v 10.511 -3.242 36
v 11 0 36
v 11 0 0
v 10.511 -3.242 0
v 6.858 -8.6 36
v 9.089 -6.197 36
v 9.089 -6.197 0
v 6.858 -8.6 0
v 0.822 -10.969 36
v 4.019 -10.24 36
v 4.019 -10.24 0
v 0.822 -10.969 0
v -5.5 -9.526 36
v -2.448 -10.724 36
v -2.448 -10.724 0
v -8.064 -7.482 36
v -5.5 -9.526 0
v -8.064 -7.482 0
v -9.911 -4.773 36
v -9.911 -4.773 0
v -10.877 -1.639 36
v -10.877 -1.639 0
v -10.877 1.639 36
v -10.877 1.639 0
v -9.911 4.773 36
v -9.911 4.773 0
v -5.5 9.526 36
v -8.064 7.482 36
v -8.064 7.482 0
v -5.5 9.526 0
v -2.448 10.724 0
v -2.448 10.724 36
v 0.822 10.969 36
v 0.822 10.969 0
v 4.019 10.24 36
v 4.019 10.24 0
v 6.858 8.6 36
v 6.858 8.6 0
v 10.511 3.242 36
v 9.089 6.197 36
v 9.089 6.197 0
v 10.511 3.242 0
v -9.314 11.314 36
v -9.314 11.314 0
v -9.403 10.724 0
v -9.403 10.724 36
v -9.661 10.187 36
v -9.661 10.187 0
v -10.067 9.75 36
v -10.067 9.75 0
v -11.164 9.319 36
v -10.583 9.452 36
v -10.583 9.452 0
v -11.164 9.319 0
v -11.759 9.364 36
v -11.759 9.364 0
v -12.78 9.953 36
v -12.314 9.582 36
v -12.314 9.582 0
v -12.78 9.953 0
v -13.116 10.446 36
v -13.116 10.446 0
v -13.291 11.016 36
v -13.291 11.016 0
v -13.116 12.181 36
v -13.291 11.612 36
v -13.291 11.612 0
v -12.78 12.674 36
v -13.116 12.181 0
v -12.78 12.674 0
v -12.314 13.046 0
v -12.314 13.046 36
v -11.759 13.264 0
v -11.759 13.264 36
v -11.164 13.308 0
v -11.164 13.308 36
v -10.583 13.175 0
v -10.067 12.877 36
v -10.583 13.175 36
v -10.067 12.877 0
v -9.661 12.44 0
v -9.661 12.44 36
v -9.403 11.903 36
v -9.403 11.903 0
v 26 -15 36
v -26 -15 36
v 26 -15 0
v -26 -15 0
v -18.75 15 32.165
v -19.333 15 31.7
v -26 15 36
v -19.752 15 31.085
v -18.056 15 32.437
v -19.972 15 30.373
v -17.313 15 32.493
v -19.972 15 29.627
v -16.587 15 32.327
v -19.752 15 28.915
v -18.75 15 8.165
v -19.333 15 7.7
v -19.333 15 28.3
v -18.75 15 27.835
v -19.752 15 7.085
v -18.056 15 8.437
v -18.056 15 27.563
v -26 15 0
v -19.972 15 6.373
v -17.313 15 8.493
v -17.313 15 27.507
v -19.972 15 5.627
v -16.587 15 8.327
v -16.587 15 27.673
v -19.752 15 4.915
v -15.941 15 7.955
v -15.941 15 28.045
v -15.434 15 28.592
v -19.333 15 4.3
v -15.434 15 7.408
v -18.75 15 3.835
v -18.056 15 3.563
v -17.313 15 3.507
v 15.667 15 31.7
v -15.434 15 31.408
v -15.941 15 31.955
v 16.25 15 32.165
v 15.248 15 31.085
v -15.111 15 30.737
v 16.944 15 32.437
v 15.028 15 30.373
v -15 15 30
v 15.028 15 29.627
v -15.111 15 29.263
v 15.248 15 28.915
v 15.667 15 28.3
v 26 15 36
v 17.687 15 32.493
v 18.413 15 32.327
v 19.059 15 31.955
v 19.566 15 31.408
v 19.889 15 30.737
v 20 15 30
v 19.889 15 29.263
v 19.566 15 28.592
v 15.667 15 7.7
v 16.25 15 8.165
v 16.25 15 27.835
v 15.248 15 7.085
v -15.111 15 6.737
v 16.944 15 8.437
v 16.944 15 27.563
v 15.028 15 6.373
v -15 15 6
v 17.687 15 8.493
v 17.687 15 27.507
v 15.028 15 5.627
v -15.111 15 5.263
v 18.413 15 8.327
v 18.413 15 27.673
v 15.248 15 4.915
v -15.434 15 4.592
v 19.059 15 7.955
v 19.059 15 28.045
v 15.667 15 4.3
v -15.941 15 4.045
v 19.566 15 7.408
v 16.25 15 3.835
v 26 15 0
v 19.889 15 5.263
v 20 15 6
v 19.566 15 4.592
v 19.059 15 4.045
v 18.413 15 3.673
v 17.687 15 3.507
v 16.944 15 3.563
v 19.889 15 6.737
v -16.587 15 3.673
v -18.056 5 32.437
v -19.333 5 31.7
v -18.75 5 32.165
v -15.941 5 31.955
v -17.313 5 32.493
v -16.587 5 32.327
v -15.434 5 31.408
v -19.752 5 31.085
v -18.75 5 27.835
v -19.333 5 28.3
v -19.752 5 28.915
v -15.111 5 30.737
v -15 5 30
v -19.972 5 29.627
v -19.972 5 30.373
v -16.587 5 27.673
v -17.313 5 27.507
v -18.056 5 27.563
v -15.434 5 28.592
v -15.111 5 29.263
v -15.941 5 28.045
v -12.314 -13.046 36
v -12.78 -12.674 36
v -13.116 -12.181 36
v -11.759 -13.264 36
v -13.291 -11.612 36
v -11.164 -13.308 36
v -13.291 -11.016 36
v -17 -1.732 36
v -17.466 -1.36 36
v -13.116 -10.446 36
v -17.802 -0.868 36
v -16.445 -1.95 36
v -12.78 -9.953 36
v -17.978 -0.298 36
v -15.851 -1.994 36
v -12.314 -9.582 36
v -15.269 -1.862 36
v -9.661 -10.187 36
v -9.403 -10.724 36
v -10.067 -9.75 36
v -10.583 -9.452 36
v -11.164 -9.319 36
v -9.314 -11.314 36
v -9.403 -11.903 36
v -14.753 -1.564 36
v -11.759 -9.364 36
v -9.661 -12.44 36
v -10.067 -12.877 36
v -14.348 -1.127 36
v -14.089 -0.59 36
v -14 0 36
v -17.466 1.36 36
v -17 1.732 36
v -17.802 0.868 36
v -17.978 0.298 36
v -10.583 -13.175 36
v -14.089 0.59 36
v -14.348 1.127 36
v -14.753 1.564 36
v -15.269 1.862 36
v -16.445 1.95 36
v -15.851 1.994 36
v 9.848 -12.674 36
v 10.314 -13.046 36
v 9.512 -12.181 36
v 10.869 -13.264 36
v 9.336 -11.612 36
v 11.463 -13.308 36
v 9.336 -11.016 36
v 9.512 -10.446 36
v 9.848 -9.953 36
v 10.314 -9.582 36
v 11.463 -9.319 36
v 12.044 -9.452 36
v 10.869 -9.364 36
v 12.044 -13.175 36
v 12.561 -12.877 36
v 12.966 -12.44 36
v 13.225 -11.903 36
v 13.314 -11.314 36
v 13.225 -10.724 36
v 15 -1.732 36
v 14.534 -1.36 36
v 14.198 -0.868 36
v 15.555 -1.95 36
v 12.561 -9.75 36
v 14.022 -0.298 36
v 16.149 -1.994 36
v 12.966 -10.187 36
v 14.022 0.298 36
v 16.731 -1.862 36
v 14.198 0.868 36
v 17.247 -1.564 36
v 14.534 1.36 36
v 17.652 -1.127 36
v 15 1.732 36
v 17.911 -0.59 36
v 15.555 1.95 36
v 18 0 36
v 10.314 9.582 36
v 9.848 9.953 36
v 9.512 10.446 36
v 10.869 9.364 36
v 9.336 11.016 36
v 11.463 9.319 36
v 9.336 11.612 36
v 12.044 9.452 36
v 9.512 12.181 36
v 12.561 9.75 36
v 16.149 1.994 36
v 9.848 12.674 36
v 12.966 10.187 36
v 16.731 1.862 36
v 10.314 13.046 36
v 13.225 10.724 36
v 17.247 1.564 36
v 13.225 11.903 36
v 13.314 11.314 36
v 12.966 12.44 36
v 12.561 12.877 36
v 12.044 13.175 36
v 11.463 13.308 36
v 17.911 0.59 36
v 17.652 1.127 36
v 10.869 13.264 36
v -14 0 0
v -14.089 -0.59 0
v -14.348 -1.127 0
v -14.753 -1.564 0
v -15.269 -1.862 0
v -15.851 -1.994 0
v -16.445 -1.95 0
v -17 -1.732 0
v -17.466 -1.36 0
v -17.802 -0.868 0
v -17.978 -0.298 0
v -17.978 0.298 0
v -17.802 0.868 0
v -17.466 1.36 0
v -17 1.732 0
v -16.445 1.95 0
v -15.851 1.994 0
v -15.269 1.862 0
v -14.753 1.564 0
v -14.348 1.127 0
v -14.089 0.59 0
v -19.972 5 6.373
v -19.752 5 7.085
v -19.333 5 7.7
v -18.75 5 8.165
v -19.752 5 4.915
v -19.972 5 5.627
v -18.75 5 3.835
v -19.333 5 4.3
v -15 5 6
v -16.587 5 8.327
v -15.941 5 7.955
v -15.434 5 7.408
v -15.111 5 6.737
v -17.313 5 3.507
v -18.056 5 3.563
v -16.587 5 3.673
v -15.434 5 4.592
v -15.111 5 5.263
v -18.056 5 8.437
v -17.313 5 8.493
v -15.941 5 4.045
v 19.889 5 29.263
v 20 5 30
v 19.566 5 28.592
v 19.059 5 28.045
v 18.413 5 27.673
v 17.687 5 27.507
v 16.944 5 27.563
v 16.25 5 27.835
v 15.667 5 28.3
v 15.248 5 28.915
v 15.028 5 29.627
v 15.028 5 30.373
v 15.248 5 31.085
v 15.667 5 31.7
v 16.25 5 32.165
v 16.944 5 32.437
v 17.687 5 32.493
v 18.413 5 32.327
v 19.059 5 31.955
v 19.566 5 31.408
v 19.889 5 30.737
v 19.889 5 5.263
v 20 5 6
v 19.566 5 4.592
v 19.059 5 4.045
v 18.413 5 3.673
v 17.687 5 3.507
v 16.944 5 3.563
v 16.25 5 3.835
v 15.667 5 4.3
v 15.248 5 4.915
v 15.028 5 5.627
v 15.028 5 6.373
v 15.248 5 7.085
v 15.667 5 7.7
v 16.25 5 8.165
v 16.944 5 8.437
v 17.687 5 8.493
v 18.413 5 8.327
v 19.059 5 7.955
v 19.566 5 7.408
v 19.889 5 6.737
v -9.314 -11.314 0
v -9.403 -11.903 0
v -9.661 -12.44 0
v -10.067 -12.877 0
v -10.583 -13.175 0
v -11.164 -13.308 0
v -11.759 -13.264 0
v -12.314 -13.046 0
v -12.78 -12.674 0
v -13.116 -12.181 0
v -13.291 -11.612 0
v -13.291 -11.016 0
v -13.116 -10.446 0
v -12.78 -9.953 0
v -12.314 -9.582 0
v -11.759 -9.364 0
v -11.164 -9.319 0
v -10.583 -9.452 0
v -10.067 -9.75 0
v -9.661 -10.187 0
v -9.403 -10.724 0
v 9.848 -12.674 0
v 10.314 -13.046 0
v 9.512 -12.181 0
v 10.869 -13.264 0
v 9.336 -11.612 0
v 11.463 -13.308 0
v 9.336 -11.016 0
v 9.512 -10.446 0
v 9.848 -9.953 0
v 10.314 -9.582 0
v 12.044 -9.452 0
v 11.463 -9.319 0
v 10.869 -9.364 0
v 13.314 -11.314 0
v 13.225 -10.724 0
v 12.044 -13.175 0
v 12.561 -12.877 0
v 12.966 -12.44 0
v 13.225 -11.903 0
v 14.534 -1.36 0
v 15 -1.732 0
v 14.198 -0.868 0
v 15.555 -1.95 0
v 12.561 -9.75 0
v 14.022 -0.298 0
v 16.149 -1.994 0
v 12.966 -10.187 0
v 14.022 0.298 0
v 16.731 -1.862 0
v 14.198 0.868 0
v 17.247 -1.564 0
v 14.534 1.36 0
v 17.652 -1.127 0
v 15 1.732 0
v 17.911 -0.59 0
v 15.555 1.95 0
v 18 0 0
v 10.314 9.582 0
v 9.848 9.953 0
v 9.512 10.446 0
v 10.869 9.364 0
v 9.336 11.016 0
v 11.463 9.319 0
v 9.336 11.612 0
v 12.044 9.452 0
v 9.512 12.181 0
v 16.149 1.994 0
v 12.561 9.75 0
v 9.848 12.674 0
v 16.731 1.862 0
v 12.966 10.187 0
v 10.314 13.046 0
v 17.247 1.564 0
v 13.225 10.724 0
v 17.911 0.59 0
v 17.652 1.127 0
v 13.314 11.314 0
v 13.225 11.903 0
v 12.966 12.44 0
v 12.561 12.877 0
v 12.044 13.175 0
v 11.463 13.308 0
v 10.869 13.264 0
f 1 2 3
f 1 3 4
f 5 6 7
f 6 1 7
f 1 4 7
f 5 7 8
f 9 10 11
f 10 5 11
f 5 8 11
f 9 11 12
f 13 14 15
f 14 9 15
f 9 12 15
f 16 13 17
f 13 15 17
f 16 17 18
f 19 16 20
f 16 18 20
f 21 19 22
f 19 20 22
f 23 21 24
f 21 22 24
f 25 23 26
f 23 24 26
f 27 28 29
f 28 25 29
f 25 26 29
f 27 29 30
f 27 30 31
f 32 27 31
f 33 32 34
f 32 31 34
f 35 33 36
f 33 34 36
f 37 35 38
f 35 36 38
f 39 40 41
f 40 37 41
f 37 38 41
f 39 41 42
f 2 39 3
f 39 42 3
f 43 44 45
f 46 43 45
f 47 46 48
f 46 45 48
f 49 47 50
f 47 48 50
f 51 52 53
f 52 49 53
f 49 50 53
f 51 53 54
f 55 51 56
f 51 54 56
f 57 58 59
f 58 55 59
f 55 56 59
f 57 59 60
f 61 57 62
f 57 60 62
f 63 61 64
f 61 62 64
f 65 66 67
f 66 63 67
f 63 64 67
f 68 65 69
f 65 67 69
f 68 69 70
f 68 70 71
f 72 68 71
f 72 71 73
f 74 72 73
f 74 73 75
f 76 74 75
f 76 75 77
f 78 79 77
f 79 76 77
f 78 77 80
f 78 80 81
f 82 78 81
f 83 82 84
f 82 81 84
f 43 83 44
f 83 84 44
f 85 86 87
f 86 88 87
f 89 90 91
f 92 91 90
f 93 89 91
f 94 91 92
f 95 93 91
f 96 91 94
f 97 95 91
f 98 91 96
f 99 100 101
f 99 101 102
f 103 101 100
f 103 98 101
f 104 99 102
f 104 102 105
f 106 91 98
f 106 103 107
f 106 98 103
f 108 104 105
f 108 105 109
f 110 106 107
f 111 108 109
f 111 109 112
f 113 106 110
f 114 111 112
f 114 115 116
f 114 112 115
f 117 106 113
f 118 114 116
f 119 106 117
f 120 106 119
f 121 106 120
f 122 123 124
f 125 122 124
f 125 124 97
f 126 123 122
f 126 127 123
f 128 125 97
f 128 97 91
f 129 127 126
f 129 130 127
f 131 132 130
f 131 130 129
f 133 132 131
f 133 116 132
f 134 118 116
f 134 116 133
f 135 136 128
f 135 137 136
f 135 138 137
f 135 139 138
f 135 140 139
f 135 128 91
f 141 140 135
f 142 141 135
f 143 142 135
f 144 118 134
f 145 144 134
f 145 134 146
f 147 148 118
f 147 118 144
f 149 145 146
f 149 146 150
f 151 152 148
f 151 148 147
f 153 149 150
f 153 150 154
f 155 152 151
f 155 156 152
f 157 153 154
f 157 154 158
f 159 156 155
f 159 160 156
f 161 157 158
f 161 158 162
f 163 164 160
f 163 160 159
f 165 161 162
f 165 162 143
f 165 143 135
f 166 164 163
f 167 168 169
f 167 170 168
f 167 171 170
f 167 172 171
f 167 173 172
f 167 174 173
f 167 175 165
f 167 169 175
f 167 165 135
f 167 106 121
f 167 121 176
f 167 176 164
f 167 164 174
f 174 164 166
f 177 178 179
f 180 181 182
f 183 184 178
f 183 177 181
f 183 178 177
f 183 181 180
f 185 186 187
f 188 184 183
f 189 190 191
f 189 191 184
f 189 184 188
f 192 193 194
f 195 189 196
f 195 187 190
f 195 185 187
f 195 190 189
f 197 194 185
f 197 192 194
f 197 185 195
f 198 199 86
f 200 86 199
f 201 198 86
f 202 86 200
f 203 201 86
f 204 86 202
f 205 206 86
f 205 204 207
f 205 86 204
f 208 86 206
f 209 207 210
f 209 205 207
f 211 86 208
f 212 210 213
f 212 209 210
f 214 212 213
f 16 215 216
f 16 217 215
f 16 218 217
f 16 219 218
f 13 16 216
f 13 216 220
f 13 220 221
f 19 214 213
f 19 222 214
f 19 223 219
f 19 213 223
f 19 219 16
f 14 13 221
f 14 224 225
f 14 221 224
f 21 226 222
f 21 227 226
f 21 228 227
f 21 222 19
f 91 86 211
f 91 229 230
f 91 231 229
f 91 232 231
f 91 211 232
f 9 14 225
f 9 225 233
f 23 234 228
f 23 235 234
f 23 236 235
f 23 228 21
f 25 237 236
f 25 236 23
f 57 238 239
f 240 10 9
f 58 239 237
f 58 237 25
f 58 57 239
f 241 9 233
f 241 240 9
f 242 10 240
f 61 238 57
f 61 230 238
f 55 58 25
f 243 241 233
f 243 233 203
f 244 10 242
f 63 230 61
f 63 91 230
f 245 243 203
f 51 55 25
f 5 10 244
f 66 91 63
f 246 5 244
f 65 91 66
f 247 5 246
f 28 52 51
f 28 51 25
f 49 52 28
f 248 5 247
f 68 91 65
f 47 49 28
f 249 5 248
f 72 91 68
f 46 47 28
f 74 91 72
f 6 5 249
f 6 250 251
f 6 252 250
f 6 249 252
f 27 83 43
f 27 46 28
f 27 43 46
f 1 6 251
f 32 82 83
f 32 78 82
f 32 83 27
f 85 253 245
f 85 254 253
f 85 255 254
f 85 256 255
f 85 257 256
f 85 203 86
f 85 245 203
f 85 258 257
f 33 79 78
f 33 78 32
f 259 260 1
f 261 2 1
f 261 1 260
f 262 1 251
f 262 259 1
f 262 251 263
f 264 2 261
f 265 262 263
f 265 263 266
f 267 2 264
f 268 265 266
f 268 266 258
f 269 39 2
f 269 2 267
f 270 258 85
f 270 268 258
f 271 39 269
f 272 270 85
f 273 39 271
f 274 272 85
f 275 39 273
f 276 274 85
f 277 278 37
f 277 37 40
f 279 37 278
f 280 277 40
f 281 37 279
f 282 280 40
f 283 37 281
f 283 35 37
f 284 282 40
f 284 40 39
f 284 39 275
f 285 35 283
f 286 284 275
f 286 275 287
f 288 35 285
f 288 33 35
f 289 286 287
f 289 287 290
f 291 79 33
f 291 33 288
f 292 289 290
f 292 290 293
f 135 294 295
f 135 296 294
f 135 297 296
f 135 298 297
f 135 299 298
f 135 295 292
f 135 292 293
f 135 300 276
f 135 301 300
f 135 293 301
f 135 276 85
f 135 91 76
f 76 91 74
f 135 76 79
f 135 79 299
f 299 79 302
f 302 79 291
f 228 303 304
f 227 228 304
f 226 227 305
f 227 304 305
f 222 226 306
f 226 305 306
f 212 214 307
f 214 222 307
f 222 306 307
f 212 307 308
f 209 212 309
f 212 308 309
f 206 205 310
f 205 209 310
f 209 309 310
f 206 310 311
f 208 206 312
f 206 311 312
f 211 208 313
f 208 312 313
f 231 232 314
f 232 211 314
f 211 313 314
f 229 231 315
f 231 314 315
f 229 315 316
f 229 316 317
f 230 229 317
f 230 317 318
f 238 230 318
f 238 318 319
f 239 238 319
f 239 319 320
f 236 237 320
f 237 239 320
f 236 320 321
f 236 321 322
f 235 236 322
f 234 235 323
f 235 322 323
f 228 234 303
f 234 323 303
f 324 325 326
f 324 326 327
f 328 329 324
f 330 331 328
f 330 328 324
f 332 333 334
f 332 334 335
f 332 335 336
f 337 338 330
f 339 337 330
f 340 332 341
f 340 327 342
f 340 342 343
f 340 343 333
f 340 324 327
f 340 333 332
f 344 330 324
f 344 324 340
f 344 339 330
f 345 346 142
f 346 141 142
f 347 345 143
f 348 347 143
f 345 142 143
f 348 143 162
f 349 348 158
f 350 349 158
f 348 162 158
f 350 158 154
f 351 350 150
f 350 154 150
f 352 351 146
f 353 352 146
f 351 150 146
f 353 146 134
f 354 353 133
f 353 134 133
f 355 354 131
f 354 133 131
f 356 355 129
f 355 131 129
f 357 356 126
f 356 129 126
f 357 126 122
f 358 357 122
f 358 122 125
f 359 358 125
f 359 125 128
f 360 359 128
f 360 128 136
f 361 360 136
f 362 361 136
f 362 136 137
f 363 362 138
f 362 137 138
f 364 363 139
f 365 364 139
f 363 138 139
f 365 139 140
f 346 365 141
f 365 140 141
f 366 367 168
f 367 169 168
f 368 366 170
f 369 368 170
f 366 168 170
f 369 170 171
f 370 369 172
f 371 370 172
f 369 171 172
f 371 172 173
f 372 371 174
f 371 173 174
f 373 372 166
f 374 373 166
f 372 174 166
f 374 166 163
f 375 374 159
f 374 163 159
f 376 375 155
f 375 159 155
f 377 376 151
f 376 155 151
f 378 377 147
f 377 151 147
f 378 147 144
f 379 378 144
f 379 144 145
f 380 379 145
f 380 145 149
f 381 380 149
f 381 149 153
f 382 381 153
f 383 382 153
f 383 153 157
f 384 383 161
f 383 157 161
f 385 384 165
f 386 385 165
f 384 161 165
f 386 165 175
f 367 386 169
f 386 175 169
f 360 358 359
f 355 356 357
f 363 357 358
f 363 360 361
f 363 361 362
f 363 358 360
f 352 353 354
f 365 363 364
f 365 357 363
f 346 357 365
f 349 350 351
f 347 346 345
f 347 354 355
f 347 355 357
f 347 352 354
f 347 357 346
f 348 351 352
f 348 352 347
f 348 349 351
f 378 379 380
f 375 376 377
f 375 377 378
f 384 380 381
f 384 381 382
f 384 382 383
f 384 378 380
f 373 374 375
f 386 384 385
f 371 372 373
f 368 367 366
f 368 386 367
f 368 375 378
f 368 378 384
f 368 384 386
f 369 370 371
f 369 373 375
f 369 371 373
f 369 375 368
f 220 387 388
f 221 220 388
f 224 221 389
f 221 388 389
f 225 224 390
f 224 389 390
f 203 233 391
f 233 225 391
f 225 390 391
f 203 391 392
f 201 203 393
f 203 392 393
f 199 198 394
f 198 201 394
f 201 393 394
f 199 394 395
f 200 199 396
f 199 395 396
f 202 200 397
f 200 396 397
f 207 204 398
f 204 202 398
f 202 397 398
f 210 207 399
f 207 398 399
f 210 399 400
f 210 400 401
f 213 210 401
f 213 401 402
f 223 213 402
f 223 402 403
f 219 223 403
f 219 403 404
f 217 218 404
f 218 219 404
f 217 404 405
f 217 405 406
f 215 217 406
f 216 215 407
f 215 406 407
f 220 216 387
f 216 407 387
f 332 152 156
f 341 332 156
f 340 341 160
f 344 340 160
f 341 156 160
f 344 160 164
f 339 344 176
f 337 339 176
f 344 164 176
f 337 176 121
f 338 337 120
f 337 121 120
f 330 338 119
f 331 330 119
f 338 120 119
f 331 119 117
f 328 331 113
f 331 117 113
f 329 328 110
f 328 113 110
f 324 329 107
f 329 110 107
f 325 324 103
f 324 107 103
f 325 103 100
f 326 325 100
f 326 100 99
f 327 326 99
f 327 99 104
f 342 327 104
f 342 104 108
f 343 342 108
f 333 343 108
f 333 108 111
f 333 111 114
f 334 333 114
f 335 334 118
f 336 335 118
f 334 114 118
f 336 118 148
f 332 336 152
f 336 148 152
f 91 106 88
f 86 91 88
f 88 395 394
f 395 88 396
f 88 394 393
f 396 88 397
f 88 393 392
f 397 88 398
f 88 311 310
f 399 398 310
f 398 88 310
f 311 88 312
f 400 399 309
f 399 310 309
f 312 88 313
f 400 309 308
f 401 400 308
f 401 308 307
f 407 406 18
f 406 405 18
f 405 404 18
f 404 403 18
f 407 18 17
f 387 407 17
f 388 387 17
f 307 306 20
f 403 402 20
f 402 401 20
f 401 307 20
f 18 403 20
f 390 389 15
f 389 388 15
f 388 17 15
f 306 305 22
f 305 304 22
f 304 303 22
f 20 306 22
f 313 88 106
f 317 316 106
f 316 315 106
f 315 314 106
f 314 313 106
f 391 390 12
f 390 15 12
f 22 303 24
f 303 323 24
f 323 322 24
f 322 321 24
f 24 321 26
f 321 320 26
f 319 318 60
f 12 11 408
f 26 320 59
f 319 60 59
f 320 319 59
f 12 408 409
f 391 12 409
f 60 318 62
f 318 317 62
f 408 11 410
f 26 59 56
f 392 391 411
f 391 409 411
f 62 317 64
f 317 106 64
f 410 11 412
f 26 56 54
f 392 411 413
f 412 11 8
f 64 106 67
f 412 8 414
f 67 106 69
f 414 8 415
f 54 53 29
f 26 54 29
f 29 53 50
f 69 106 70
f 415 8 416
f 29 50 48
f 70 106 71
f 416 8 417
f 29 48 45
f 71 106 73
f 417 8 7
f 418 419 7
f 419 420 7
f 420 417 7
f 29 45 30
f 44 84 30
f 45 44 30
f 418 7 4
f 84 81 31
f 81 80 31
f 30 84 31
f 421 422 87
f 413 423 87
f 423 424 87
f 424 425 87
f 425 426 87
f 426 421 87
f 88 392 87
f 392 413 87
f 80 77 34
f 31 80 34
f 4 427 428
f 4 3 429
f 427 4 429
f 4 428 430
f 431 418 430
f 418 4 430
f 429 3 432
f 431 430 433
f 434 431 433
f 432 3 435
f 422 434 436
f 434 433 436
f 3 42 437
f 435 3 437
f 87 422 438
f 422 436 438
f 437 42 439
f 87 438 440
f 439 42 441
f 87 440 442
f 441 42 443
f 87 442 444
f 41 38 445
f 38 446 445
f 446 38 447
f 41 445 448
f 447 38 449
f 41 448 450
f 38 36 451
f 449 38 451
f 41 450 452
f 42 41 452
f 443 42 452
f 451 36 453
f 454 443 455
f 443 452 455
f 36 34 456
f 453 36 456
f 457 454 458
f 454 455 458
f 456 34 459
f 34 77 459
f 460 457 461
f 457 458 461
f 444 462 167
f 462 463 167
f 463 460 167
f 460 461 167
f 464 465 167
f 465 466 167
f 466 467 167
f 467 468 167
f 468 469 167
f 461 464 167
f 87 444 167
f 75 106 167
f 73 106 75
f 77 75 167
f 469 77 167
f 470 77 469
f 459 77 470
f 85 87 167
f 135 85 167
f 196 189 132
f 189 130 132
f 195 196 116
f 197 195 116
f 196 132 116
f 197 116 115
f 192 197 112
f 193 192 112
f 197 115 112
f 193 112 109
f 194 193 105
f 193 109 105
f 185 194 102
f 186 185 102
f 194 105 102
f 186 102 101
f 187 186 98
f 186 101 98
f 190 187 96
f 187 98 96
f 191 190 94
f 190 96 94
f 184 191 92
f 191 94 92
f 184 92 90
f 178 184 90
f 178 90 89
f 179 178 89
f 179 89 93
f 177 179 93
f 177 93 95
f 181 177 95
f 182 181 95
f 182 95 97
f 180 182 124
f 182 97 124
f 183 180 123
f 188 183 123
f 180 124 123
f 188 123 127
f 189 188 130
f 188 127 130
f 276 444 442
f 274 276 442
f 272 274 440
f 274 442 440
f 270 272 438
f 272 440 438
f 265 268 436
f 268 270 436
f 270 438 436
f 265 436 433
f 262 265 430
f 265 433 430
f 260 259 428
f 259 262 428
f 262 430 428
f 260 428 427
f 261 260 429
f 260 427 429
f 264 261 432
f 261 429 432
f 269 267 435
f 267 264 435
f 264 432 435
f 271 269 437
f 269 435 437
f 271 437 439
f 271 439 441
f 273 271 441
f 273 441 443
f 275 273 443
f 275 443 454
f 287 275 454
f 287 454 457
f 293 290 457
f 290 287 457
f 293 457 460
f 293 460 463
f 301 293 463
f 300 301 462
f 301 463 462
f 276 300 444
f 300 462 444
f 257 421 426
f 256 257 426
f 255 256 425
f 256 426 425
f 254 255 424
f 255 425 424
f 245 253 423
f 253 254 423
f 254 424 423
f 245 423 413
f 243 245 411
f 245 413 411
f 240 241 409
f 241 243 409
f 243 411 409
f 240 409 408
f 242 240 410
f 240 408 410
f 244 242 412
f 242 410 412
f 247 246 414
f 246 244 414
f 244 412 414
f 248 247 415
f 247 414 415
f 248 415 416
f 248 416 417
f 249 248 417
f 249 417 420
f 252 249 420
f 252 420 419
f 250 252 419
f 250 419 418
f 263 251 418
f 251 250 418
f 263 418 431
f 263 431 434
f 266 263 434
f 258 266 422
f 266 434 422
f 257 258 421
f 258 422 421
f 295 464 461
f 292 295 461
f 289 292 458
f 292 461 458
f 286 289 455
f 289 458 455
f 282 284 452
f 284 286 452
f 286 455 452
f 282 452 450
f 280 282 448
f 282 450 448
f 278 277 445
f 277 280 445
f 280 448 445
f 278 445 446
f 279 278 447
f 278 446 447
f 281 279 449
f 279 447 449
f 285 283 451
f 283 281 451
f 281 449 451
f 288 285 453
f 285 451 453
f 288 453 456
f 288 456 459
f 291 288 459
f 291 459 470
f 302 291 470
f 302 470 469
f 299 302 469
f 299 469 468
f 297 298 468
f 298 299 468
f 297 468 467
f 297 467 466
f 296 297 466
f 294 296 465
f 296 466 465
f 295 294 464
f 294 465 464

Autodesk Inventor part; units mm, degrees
ref_plane "YZ Plane" through (0, 0, 0) normal (1, 0, 0) x (0, 1, 0)
ref_plane "XZ Plane" through (0, 0, 0) normal (0, 1, 0) x (-1, 0, 0)
ref_plane "XY Plane" through (0, 0, 0) normal (0, 0, 1) x (1, 0, 0)
sketch "Sketch1" plane through (0, 0, 0) normal (0, 0, 1) x (1, 0, 0)
  circle A0 centre (0, 0) radius 11
  line L0 (-26, -15) -> (26, -15)
  line L1 (26, -15) -> (26, 15)
  line L2 (-26, 15) -> (-26, -15)
  circle A1 centre (0, 0) radius 16 construction
  circle A2 centre (11.3137, 11.3137) radius 2
  circle A3 centre (-11.3137, -11.3137) radius 2
  circle A4 centre (11.3137, -11.3137) radius 2
  circle A5 centre (-11.3137, 11.3137) radius 2
  circle A6 centre (-16, 0) radius 2
  circle A7 centre (16, 0) radius 2
  line L3 (-11.3137, 11.3137) -> (0, 0) construction
  line L4 (0, 0) -> (-16, 0) construction
  line L5 (-26, 15) -> (26, 15)
  point P0 (0, -15)
  dimension "d0" = 22
  dimension "d2" = 52
  dimension "d3" = 32
  dimension "d4" = 4
  dimension "d5" = 45
  dimension "d6" = 15
  dimension "d16" = 30
extrude "Extrusion1" add sketch "Sketch1" along normal blind 36
sketch "Sketch3" plane through (-26, 15, 0) normal (0, 1, 0) x (1, 0, 0)
  circle A0 centre (8.5, -6) radius 2.5
  circle A1 centre (43.5, -6) radius 2.5
  circle A2 centre (43.5, -30) radius 2.5
  circle A3 centre (8.5, -30) radius 2.5
  line L0 (8.5, -6) -> (43.5, -6) construction
  line L1 (43.5, -6) -> (43.5, -30) construction
  line L2 (43.5, -30) -> (8.5, -30) construction
  line L3 (8.5, -30) -> (8.5, -6) construction
  line L4 (52, 0) -> (0, 0) construction
  line L5 (52, 0) -> (52, -36) construction
  point P0 (26, 0)
  point P1 (26, -6)
  point P2 (26, 0)
  point P3 (43.5, -18)
  point P4 (52, -18)
  dimension "d17" = 5
  dimension "d18" = 35
  dimension "d19" = 24
extrude "Extrusion3" cut sketch "Sketch3" against normal blind 10
properties part number "DSG16H"
